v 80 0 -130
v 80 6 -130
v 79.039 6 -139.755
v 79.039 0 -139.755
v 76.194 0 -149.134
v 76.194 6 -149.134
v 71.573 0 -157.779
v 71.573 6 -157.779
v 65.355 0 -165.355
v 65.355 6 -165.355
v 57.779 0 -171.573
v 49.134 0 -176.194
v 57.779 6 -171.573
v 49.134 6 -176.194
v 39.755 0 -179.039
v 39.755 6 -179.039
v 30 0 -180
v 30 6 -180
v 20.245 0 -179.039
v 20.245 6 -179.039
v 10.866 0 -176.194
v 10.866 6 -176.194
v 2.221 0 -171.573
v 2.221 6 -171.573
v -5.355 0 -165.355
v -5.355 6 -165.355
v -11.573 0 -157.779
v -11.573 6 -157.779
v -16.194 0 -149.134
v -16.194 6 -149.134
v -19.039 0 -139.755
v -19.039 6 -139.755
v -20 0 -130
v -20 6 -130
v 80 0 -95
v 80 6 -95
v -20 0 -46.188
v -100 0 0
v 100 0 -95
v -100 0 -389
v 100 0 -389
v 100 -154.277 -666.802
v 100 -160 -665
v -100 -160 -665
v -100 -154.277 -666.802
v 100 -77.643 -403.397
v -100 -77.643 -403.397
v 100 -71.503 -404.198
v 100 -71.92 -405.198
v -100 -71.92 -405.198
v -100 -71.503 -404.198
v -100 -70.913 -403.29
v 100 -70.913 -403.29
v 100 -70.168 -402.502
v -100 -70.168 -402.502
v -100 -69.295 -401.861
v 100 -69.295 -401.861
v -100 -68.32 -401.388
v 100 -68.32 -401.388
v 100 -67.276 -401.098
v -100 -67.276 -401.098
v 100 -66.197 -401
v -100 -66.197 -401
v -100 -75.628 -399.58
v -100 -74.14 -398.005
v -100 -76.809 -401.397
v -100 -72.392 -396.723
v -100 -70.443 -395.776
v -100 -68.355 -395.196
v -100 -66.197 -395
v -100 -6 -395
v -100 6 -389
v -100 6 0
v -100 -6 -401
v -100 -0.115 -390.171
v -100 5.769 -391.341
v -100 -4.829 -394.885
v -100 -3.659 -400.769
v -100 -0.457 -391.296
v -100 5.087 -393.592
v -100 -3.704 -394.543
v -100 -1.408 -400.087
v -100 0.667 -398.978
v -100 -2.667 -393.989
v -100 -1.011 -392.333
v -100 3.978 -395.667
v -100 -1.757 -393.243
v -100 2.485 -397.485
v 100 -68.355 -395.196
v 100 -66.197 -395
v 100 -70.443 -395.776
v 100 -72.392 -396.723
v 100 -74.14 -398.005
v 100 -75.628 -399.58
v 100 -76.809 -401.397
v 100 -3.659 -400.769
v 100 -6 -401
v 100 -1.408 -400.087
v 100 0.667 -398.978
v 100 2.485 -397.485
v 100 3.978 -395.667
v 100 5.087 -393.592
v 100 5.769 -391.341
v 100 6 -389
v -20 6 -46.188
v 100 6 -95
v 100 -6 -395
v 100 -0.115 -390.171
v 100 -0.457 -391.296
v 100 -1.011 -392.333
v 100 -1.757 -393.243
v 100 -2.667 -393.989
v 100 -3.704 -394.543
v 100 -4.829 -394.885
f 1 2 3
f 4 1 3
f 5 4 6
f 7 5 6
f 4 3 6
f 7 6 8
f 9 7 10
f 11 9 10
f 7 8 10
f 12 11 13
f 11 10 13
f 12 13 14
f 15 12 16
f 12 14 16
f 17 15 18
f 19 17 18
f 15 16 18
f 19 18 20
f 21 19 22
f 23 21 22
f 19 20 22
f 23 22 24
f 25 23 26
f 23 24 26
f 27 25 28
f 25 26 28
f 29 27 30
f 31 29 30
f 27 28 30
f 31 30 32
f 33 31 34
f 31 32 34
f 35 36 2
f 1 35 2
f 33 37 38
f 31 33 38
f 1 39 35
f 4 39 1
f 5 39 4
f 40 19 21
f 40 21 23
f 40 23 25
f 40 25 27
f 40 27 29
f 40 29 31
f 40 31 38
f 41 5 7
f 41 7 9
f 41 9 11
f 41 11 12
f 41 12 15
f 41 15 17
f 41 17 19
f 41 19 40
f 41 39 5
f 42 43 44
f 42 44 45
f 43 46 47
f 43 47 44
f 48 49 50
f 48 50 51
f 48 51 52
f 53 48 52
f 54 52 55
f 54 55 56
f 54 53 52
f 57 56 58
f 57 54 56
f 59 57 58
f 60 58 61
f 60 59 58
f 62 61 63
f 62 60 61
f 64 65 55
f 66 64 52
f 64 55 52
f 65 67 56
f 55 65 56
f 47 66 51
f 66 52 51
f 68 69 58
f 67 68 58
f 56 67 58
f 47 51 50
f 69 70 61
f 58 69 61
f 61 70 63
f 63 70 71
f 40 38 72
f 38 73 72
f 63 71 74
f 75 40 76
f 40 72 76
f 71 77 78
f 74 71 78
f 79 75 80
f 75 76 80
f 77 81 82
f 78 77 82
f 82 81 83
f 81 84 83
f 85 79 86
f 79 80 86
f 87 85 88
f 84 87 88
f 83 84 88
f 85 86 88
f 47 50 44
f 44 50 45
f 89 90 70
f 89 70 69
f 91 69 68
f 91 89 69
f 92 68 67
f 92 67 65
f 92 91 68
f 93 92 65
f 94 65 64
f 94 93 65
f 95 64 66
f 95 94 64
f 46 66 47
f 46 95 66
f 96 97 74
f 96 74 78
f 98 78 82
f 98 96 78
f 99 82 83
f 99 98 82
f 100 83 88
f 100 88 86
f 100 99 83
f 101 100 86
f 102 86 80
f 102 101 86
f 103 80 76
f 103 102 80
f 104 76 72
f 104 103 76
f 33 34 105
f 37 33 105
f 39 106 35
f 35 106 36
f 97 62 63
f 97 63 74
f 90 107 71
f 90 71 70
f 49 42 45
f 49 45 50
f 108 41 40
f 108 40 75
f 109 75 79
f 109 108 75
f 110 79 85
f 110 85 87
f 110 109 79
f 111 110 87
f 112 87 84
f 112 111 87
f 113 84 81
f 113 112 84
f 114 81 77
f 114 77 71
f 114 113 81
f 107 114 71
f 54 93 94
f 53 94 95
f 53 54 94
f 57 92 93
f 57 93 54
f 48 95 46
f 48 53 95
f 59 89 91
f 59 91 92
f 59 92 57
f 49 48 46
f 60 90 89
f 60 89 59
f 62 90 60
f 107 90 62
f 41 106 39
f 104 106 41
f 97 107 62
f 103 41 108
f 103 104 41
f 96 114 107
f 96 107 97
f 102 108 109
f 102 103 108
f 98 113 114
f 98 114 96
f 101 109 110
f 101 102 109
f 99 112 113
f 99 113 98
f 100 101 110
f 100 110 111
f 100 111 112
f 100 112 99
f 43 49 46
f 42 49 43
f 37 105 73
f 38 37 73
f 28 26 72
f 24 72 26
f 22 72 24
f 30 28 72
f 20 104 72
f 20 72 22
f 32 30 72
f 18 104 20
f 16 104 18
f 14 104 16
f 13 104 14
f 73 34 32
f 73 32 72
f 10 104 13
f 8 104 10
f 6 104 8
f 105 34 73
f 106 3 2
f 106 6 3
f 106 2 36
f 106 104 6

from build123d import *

# Parameters (mm, degrees)
SM_BASE_FLANGE_1_DEPTH = 100
CUT_EXTRUDE_1_REACH    = 696.392


# Sheet-metal steps are written as plain solids
with BuildPart() as part:
    # Sketch 1 → 基体-法兰1 (new, symmetric)
    with BuildSketch(Plane(origin=(0, 0, 0), x_dir=(0, 0, -1), z_dir=(1, 0, 0))):
        with BuildLine():
            Line((0, 0), (389, 0))
            ThreePointArc((389, 0), (393.242640687, -1.757359313), (395, -6))
            Line((395, -6), (395, -66.197173462))
            ThreePointArc((395, -66.197173462), (397.324227007, -73.295019402), (403.396569497, -77.643364471))
            Line((403.396569497, -77.643364471), (665, -160))
            Line((665, -160), (666.801715251, -154.276904496))
            Line((666.801715251, -154.276904496), (405.198284749, -71.920268967))
            ThreePointArc((405.198284749, -71.920268967), (402.162113503, -69.746096432), (401, -66.197173462))
            Line((401, -66.197173462), (401, -6))
            ThreePointArc((401, -6), (397.485281374, 2.485281374), (389, 6))
            Line((389, 6), (0, 6))
            Line((0, 6), (0, 0))
        make_face()
    extrude(amount=SM_BASE_FLANGE_1_DEPTH, both=True)

    # 草图4 → 切除-拉伸1 (cut, up to next)
    with BuildSketch(Plane(origin=(0, 6, 0), x_dir=(1, 0, 0), z_dir=(0, 1, 0)), mode=Mode.PRIVATE) as cut_extrude_1_sk1:
        with BuildLine():
            Line((-20, 130), (-20, 46.188021535))
            Line((-20, 46.188021535), (-100, 0))
            Line((-100, 0), (100, 0))
            Line((100, 0), (100, 95))
            Line((100, 95), (80, 95))
            Line((80, 95), (80, 130))
            ThreePointArc((80, 130), (30, 180), (-20, 130))
        make_face()
    cut_extrude_1_tool1 = extrude(cut_extrude_1_sk1.sketch, amount=-CUT_EXTRUDE_1_REACH, mode=Mode.PRIVATE) & part.part
    add(cut_extrude_1_tool1.solids().sort_by_distance((28.66293, 6, -75.336076))[0], mode=Mode.SUBTRACT)


solid = part.part
